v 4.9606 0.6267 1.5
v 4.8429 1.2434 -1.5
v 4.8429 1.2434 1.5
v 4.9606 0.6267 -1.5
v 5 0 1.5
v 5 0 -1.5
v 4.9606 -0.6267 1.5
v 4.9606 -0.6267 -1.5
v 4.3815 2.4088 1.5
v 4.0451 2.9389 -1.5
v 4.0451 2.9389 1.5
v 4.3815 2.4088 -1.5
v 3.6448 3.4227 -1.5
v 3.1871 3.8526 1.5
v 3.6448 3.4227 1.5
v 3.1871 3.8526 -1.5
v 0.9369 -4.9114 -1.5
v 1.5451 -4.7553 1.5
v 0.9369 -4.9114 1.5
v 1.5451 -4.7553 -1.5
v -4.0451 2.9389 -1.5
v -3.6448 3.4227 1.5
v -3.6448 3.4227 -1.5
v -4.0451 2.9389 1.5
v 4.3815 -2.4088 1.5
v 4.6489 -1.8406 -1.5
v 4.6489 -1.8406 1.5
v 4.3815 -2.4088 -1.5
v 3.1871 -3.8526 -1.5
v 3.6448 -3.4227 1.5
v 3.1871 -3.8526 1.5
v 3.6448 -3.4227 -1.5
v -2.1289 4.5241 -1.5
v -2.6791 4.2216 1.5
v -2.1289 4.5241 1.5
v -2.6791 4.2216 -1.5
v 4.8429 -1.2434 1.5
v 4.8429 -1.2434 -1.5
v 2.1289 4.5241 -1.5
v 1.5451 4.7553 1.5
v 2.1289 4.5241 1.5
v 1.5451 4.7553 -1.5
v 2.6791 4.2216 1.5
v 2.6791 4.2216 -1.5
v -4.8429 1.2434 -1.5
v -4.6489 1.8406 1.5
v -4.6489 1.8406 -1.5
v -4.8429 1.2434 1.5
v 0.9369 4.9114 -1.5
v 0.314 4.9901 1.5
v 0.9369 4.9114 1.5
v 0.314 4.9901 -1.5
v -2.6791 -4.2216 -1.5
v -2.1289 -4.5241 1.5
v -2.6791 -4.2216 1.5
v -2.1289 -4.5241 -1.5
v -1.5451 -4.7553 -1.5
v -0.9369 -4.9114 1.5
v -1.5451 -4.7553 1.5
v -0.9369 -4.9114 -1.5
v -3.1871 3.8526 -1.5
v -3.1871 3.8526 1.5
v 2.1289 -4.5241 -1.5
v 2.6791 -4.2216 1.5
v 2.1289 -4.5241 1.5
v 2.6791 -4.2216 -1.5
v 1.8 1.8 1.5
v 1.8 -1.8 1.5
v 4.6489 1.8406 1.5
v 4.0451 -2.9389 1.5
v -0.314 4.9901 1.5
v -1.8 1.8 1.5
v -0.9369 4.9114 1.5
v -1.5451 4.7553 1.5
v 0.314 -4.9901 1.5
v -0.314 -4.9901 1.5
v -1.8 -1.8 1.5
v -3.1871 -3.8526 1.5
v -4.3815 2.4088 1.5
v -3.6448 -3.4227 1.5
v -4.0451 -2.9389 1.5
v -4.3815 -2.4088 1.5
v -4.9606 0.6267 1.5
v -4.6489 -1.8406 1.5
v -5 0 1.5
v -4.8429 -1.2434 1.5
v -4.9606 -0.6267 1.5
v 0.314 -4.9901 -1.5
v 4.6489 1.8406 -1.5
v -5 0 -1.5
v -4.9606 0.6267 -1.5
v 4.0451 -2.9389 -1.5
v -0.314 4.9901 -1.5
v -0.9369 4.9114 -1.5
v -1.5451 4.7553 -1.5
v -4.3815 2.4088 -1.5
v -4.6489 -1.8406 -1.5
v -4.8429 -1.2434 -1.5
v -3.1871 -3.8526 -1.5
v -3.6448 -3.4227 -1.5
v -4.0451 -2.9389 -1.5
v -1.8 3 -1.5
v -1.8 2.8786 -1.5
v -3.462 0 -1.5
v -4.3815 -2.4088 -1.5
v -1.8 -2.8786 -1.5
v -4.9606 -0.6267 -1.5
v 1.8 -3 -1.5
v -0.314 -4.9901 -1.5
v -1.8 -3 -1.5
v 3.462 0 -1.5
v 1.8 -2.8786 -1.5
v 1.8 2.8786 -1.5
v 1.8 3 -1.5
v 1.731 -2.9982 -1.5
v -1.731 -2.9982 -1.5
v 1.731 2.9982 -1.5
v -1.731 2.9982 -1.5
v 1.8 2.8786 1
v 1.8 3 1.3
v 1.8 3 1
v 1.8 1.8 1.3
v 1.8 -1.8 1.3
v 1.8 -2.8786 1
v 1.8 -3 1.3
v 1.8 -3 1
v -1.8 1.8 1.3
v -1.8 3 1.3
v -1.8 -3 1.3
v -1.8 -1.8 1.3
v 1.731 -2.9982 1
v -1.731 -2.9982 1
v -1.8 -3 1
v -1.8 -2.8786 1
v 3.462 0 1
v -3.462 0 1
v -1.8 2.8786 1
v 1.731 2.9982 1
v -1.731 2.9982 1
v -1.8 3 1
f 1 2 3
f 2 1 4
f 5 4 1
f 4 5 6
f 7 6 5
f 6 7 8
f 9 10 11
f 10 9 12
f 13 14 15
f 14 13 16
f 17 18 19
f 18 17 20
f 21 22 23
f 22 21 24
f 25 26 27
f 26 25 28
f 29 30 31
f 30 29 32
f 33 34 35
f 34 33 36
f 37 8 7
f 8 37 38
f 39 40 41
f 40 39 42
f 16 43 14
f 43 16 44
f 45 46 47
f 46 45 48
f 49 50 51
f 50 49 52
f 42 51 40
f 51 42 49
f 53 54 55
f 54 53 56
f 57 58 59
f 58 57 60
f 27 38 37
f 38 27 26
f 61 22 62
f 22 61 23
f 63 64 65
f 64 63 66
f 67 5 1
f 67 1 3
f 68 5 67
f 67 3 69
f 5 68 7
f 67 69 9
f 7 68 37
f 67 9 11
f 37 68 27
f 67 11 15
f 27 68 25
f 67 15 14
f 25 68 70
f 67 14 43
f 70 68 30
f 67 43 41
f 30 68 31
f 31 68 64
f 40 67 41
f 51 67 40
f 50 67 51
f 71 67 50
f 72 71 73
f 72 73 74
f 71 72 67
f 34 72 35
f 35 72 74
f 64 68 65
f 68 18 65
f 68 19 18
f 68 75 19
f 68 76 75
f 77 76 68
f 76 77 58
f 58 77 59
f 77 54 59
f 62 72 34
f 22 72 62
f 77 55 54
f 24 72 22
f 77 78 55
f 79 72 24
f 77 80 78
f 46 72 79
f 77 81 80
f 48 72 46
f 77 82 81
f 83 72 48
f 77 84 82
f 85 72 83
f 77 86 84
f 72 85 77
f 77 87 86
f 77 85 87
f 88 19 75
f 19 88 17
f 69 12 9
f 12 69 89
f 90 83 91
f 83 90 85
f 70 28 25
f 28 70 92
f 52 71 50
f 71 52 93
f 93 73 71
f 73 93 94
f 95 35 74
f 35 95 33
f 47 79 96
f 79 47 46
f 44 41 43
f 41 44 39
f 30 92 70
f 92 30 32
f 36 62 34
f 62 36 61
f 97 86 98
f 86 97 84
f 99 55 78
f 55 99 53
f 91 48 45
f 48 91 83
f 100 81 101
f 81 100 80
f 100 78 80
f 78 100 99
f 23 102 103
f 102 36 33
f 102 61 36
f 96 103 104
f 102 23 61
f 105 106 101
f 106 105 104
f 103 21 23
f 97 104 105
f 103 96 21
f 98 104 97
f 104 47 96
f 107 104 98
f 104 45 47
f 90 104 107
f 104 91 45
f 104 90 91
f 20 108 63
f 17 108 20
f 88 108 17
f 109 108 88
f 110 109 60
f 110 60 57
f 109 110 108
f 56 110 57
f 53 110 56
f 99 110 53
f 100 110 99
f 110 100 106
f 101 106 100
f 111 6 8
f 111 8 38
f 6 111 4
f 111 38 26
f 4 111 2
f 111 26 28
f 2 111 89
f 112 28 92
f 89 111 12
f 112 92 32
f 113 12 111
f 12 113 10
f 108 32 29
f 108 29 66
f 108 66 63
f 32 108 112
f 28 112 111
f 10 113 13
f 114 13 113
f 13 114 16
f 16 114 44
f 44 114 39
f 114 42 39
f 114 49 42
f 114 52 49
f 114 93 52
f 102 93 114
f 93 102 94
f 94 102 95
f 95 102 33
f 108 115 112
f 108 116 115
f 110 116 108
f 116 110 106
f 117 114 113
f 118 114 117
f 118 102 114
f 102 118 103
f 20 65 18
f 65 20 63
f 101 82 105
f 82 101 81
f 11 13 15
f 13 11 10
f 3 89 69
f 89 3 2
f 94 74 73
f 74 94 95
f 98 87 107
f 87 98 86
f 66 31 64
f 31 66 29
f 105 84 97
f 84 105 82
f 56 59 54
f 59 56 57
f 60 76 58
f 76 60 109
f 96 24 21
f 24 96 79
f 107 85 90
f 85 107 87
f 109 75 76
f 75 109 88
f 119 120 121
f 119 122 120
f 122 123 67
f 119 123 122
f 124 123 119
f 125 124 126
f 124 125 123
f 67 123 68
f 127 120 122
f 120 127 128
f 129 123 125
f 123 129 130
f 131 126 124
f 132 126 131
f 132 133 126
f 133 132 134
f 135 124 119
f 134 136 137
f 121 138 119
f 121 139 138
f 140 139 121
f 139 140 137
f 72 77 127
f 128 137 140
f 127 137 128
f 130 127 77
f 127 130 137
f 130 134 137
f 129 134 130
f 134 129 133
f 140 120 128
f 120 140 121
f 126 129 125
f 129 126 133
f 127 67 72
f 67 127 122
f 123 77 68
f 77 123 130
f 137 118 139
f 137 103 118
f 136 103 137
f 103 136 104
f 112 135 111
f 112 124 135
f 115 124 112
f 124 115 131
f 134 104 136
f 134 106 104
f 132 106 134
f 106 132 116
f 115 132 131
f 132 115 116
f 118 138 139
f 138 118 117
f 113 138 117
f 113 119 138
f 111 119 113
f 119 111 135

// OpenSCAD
$fn = 50;


difference() {
	union() {
		translate(v = [0, 0, -1.5000000000]) {
			cylinder(h = 3, r = 5.0000000000);
		}
		translate(v = [0, 0, -1.5000000000]) {
			cylinder(h = 3, r = 2.8500000000);
		}
	}
	union() {
		translate(v = [0, 0, -1.5000000000]) {
			rotate(a = [0, 0, 0]) {
				difference() {
					union() {
						translate(v = [-1.8000000000, -3.0000000000, -0.3000000000]) {
							cube(size = [3.6000000000, 6.0000000000, 0.3000000000]);
						}
						translate(v = [-1.8000000000, -1.8000000000, -0.6000000000]) {
							cube(size = [3.6000000000, 3.6000000000, 0.3000000000]);
						}
						translate(v = [-1.8000000000, -3.0000000000, 2.5000000000]) {
							cube(size = [3.6000000000, 6.0000000000, 0.3000000000]);
						}
						translate(v = [-1.8000000000, -1.8000000000, 2.8000000000]) {
							cube(size = [3.6000000000, 3.6000000000, 0.3000000000]);
						}
						linear_extrude(height = 2.5000000000) {
							polygon(points = [[3.4620000000, 0.0000000000], [1.7310000000, 2.9981799479], [-1.7310000000, 2.9981799479], [-3.4620000000, 0.0000000000], [-1.7310000000, -2.9981799479], [1.7310000000, -2.9981799479]]);
						}
						translate(v = [-1.8000000000, -3.0000000000, -0.3000000000]) {
							cube(size = [3.6000000000, 6.0000000000, 0.3000000000]);
						}
						translate(v = [-1.8000000000, -1.8000000000, -0.6000000000]) {
							cube(size = [3.6000000000, 3.6000000000, 0.3000000000]);
						}
						translate(v = [-1.8000000000, -3.0000000000, 2.5000000000]) {
							cube(size = [3.6000000000, 6.0000000000, 0.3000000000]);
						}
						translate(v = [-1.8000000000, -1.8000000000, 2.8000000000]) {
							cube(size = [3.6000000000, 3.6000000000, 0.3000000000]);
						}
						translate(v = [-1.8000000000, -3.0000000000, -0.3000000000]) {
							cube(size = [3.6000000000, 6.0000000000, 0.3000000000]);
						}
						translate(v = [-1.8000000000, -1.8000000000, -0.6000000000]) {
							cube(size = [3.6000000000, 3.6000000000, 0.3000000000]);
						}
						translate(v = [-1.8000000000, -3.0000000000, 2.5000000000]) {
							cube(size = [3.6000000000, 6.0000000000, 0.3000000000]);
						}
						translate(v = [-1.8000000000, -1.8000000000, 2.8000000000]) {
							cube(size = [3.6000000000, 3.6000000000, 0.3000000000]);
						}
					}
					union();
				}
			}
		}
		translate(v = [0, 0, -50.0000000000]) {
			cylinder(h = 100, r = 1.8000000000);
		}
	}
}
